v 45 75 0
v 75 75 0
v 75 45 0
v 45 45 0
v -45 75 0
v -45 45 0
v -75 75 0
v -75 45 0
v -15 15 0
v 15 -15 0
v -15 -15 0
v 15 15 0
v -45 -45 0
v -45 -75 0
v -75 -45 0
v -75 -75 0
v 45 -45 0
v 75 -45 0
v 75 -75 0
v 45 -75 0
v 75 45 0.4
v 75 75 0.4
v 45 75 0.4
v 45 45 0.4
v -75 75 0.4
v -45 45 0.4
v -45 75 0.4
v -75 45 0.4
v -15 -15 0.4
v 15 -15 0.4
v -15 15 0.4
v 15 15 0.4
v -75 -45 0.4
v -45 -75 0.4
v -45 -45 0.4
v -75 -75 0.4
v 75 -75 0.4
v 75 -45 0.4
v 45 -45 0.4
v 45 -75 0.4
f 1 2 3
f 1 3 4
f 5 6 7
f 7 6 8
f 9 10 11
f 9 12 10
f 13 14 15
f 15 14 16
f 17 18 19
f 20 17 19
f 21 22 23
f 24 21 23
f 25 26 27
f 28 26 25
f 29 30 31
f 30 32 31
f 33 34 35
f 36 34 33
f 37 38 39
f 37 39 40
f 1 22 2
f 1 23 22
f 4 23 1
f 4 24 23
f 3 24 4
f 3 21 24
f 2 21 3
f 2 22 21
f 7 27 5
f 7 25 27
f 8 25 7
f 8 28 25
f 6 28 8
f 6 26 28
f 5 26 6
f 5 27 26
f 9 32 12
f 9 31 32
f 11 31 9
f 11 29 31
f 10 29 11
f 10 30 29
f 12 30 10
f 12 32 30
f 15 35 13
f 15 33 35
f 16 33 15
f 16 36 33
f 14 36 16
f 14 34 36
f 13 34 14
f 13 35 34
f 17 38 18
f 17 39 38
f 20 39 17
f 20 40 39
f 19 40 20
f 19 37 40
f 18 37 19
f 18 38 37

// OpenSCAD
ssize=30;
height=0.4; // single layer

linear_extrude(height) {
    translate([-ssize/2,-ssize/2]) square([ssize,ssize]);
    translate([ssize*1.5,ssize*1.5]) square([ssize,ssize]);
    translate([-ssize*2.5,ssize*1.5]) square([ssize,ssize]);
    translate([-ssize*2.5,-ssize*2.5]) square([ssize,ssize]);
    translate([ssize*1.5,-ssize*2.5]) square([ssize,ssize]);
}
